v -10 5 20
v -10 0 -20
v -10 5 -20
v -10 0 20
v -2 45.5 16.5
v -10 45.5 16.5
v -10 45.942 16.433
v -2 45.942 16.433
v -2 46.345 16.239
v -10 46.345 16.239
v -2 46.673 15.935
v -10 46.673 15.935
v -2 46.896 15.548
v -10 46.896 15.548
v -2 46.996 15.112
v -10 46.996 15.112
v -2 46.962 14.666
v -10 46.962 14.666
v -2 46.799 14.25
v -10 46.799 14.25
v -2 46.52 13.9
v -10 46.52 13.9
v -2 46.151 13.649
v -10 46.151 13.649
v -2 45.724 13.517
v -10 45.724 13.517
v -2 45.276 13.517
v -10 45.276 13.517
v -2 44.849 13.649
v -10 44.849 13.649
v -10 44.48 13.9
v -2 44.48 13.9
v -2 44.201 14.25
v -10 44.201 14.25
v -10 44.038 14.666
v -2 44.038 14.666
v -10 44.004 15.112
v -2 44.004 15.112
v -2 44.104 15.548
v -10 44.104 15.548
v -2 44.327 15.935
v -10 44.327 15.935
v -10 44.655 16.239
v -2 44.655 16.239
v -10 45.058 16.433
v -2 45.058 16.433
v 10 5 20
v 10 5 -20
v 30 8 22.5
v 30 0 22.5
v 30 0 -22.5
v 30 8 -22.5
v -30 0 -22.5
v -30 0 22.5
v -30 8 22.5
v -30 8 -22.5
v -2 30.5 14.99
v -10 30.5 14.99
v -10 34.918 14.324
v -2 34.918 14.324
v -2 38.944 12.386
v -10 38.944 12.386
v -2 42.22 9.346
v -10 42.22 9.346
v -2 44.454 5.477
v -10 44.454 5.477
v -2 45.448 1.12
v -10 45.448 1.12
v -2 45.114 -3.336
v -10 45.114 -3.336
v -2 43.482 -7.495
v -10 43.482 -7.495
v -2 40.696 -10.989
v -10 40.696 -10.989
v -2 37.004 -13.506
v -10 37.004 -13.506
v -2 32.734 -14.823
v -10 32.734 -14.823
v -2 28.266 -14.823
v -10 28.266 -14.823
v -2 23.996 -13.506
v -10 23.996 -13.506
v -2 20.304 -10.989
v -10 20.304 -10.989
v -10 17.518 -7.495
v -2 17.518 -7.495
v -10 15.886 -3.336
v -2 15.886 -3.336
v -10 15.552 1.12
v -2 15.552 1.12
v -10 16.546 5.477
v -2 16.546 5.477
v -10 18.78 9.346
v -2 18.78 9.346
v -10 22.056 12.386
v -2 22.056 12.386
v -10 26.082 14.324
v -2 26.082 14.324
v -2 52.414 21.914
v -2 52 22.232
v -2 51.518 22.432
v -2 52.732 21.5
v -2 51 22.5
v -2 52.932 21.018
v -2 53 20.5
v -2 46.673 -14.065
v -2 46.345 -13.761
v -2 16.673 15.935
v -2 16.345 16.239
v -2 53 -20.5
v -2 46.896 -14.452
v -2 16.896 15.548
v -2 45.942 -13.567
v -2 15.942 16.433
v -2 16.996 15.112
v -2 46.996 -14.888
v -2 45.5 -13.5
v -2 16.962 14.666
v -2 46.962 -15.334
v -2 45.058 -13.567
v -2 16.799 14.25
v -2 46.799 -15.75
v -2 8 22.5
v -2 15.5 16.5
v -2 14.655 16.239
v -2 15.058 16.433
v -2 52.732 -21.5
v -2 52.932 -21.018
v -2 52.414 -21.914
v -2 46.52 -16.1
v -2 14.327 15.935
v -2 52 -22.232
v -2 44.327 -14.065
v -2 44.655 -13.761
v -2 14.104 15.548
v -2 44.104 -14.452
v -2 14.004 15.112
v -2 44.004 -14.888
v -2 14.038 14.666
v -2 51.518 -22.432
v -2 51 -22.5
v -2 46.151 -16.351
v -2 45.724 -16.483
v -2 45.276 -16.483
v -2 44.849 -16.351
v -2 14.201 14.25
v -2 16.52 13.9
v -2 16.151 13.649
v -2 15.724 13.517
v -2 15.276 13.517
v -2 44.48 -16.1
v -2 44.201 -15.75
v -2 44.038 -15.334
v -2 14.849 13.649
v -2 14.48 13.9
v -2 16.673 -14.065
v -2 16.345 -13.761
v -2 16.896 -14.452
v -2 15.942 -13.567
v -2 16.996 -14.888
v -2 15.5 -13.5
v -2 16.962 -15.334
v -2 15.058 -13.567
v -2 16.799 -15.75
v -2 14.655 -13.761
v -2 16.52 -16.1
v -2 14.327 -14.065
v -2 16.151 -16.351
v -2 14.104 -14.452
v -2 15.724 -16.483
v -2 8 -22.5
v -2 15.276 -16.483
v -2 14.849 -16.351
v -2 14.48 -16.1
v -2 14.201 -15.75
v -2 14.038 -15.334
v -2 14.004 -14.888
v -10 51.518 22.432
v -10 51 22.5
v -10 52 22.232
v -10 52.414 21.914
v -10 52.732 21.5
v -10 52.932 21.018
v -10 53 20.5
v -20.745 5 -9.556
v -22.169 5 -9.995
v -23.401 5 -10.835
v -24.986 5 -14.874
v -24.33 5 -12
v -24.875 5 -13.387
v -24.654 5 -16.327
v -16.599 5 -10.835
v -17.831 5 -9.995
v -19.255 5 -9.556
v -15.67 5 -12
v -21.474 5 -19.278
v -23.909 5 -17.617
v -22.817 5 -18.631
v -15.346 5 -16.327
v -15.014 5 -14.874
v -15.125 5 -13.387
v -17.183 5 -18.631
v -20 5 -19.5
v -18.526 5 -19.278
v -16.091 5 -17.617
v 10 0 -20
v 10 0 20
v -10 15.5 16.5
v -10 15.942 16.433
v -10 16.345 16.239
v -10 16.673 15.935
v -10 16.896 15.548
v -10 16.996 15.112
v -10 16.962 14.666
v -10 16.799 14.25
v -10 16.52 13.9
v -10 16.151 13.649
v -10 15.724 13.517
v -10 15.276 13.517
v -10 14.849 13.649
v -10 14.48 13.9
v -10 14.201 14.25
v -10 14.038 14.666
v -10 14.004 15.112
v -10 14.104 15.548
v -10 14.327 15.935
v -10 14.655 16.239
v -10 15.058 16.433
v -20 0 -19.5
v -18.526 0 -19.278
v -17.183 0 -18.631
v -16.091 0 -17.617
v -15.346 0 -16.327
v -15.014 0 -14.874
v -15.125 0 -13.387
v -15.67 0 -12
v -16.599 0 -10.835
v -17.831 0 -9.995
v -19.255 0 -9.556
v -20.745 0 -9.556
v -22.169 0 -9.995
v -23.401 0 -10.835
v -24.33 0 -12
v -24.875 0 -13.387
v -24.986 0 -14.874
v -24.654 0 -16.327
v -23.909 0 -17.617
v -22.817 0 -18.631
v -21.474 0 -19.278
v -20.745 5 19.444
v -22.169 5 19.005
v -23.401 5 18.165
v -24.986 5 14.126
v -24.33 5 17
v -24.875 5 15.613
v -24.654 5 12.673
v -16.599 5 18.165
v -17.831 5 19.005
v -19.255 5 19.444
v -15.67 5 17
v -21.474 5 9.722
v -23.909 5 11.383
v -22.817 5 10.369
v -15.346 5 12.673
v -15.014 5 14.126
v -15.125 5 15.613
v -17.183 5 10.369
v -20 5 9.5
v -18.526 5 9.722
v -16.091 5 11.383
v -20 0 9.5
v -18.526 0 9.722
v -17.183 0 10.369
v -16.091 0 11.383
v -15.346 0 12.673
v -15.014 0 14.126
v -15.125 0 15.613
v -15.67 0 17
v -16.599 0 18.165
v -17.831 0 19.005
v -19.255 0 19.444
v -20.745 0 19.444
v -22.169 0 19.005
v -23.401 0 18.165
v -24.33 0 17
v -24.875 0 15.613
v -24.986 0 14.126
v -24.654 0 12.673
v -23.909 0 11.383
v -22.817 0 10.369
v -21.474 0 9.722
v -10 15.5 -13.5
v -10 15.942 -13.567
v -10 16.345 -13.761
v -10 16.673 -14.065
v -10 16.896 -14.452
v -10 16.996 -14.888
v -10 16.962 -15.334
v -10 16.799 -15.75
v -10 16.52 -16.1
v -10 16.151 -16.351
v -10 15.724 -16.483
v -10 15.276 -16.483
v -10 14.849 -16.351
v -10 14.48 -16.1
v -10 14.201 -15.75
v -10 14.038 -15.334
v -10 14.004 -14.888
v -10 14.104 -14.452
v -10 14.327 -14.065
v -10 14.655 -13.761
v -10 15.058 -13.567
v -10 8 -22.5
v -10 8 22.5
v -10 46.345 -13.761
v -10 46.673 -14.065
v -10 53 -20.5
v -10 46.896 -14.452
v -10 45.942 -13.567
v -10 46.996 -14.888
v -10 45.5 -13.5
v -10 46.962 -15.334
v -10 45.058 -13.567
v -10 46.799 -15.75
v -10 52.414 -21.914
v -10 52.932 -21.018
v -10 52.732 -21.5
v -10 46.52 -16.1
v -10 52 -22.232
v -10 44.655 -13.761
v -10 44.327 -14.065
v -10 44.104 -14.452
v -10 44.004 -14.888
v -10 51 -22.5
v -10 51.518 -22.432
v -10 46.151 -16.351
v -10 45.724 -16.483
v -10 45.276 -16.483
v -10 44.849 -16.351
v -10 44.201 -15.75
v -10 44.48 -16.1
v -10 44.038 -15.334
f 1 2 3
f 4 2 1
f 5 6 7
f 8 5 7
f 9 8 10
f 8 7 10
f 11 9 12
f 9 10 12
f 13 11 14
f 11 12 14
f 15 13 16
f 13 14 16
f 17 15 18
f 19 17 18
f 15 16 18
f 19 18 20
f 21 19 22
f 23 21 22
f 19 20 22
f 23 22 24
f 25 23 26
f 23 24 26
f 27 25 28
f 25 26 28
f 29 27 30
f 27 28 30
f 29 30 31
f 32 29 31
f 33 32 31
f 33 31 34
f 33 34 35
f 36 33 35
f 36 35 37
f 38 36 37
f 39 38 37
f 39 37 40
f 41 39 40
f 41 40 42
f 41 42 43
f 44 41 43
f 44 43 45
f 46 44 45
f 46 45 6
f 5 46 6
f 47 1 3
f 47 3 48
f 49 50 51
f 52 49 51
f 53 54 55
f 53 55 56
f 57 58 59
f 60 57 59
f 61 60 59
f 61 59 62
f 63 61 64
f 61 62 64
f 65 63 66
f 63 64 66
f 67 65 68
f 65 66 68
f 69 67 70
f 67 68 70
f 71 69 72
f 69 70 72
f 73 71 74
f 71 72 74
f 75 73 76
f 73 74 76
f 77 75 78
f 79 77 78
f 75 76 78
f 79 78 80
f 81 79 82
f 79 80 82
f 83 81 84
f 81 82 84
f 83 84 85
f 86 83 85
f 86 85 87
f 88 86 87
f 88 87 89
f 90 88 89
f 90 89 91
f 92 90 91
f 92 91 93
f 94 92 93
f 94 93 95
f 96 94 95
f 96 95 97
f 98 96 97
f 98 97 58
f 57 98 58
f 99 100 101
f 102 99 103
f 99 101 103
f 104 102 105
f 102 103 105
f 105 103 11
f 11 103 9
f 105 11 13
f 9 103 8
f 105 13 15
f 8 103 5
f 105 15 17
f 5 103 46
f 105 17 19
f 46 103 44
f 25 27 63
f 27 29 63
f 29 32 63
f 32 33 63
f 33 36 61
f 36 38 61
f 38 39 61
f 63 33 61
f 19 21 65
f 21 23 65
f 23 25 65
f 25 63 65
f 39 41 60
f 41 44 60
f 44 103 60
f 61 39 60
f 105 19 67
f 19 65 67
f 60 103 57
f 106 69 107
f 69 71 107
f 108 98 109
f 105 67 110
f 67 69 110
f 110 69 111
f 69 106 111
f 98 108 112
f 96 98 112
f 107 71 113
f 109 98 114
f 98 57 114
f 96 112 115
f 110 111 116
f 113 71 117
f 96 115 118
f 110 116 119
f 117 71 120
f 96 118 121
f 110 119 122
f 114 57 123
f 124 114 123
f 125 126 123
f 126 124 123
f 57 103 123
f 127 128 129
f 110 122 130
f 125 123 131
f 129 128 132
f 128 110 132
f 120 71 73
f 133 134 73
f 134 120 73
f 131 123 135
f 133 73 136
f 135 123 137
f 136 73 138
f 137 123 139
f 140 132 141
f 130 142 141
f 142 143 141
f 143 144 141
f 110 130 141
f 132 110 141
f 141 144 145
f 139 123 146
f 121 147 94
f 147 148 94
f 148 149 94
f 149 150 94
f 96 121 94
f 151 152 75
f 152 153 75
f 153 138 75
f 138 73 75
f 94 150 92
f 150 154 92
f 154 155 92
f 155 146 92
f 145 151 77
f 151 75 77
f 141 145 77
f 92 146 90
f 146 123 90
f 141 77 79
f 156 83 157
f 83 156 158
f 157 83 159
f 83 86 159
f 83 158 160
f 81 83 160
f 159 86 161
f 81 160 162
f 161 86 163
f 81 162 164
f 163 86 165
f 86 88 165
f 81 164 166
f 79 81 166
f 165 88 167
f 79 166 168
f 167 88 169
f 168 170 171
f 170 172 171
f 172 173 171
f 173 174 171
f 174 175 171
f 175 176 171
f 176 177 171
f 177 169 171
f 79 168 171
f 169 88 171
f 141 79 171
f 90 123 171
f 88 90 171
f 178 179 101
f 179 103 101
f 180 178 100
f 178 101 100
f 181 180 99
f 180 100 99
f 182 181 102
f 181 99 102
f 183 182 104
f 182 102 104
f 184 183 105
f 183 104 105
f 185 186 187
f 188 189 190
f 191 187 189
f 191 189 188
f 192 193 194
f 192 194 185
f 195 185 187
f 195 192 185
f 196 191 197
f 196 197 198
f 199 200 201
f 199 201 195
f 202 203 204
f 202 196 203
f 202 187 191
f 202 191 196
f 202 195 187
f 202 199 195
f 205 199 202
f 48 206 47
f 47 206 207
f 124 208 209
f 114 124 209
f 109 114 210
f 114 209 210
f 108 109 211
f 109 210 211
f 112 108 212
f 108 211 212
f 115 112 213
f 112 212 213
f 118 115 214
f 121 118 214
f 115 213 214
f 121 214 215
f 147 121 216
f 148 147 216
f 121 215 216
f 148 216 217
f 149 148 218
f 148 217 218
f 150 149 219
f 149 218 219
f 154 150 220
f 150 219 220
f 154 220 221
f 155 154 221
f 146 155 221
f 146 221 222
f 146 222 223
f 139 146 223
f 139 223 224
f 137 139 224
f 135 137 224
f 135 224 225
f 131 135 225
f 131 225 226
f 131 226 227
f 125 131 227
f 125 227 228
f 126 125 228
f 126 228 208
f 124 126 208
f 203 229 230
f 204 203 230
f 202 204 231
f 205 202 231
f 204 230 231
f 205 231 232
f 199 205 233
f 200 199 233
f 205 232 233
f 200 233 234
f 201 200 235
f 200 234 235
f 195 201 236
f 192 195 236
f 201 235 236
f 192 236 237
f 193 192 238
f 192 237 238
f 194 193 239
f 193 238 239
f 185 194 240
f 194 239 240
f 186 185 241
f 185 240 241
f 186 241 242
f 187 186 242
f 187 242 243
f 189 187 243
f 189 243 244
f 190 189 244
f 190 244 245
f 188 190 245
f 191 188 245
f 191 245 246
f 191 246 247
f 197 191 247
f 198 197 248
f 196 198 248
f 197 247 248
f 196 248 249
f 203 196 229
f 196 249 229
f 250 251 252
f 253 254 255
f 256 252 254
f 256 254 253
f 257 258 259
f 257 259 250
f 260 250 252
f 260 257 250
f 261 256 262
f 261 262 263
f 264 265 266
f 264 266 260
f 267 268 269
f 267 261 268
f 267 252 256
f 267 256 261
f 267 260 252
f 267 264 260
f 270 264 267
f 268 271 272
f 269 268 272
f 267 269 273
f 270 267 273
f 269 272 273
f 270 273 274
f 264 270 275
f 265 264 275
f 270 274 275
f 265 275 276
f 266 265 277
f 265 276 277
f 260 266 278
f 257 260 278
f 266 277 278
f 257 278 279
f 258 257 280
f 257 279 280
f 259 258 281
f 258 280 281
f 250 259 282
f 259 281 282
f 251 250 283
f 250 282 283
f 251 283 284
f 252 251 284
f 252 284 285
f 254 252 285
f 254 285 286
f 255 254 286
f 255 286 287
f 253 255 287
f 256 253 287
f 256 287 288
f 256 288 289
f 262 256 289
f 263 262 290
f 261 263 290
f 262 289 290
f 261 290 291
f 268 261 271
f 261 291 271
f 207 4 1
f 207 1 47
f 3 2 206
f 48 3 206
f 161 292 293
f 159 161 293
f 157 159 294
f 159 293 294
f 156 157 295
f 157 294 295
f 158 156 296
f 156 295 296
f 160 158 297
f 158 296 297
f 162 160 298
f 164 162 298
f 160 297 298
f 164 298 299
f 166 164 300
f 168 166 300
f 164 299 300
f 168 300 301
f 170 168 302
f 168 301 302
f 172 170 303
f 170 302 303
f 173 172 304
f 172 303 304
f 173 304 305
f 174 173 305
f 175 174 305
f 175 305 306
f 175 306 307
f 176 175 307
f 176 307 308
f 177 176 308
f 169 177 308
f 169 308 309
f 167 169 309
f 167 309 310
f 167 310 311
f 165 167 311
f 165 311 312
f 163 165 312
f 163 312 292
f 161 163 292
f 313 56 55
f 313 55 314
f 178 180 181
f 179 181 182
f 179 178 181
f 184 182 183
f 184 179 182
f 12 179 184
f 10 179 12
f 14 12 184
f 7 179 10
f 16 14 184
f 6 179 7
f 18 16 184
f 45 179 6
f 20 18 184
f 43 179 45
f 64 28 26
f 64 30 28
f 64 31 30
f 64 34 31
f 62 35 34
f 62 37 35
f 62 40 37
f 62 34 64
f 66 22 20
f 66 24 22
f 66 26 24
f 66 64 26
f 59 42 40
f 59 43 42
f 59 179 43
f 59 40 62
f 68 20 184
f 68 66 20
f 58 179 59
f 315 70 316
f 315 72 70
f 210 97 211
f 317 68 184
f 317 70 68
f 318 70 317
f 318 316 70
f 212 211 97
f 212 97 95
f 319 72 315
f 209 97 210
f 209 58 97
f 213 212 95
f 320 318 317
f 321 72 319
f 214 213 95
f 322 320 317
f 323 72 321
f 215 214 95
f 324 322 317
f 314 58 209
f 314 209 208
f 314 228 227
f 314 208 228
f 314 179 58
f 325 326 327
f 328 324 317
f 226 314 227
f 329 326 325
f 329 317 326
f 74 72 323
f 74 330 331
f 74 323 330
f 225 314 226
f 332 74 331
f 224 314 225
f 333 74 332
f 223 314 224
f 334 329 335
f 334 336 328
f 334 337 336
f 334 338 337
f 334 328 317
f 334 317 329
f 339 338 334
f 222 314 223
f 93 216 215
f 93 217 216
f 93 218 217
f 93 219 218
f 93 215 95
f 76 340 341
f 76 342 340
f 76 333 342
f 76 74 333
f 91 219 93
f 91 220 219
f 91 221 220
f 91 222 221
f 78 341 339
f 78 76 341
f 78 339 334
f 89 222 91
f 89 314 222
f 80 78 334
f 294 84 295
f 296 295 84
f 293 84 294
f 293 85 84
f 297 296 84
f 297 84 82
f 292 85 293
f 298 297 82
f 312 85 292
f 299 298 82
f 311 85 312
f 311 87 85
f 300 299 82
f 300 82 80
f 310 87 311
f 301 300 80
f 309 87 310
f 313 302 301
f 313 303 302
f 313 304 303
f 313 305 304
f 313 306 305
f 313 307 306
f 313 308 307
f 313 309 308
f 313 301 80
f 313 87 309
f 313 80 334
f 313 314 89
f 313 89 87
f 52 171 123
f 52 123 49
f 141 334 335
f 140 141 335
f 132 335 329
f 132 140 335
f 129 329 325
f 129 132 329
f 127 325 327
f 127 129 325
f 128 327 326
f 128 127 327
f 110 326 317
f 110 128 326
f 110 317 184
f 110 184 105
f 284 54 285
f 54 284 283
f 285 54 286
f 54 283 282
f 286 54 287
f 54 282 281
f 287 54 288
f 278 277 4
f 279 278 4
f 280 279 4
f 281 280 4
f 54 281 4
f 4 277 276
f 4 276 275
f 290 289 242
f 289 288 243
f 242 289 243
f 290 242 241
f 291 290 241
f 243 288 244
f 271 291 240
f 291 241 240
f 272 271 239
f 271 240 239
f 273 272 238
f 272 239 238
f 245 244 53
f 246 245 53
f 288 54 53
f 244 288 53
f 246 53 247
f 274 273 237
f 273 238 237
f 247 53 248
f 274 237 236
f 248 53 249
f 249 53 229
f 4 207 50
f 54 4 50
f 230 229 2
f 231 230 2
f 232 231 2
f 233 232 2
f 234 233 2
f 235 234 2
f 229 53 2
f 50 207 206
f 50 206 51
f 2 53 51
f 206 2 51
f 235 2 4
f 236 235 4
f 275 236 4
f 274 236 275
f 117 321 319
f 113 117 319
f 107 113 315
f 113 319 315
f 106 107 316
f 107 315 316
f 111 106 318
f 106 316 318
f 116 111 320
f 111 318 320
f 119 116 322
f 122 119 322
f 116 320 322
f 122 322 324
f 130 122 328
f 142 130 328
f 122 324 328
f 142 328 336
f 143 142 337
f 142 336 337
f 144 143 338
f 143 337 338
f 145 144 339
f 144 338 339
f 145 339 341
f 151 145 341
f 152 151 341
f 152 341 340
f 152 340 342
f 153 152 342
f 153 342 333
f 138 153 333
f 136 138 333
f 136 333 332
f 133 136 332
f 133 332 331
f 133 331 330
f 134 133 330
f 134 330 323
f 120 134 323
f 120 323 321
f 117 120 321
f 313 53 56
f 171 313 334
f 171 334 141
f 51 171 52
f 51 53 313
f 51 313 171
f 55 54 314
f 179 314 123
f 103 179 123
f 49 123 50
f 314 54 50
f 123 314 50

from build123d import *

# Parameters (mm, degrees)
SKETCH1_W           = 60
SKETCH1_H           = 45
BOSS_EXTRUDE1_DEPTH = 8
SKETCH2_R           = 5
CUT_EXTRUDE1_DEPTH  = 5
SKETCH3_W           = 20
SKETCH3_H           = 40
CUT_EXTRUDE2_DEPTH  = 5
SKETCH4_W           = 8
SKETCH4_H           = 45
BOSS_EXTRUDE3_DEPTH = 45
SKETCH6_R           = 1.5
CUT_EXTRUDE3_DEPTH  = 45
FILLET2_R           = 2
SKETCH7_R           = 14.99024042
CUT_EXTRUDE4_DEPTH  = 71.10884395


with BuildPart() as part:
    # Sketch1 → Boss-Extrude1 (new body)
    with BuildSketch(Plane(origin=(0, 0, 0), x_dir=(1, 0, 0), z_dir=(0, 1, 0))):
        Rectangle(SKETCH1_W, SKETCH1_H)
    extrude(amount=BOSS_EXTRUDE1_DEPTH)

    # Sketch2 → Cut-Extrude1 (cut)
    with BuildSketch(Plane.XZ):
        with Locations(Location((-20, 14.5, 0), (0, 0, 270))):
            Circle(SKETCH2_R)
        with Locations(Location((-20, -14.5, 0), (0, 0, 270))):
            Circle(SKETCH2_R)
    extrude(amount=-CUT_EXTRUDE1_DEPTH, mode=Mode.SUBTRACT)

    # Sketch3 → Cut-Extrude2 (cut)
    with BuildSketch(Plane.XZ):
        Rectangle(SKETCH3_W, SKETCH3_H)
    extrude(amount=-CUT_EXTRUDE2_DEPTH, mode=Mode.SUBTRACT)

    # Sketch4 → Boss-Extrude3 (add)
    with BuildSketch(Plane(origin=(0, 8, 0), x_dir=(1, 0, 0), z_dir=(0, 1, 0))):
        with Locations((-6, 0)):
            Rectangle(SKETCH4_W, SKETCH4_H)
    extrude(amount=BOSS_EXTRUDE3_DEPTH)

    # Sketch6 → Cut-Extrude3 (cut)
    with BuildSketch(Plane.ZY.offset(10)):
        with Locations((-15, 45.5)):
            Circle(SKETCH6_R)
        with Locations((15, 45.5)):
            Circle(SKETCH6_R)
        with Locations((15, 15.5)):
            Circle(SKETCH6_R)
        with Locations((-15, 15.5)):
            Circle(SKETCH6_R)
    extrude(amount=-CUT_EXTRUDE3_DEPTH, mode=Mode.SUBTRACT)

    # Fillet2
    fillet2_edges = [part.edges().sort_by_distance(p)[0] for p in [
        (-6, 53, -22.5),
        (-6, 53, 22.5),
    ]]
    fillet(fillet2_edges, radius=FILLET2_R)

    # Sketch7 → Cut-Extrude4 (cut, through all)
    with BuildSketch(Plane.ZY.offset(10)):
        with Locations((0, 30.5)):
            Circle(SKETCH7_R)
    extrude(amount=-CUT_EXTRUDE4_DEPTH, mode=Mode.SUBTRACT)


solid = part.part
